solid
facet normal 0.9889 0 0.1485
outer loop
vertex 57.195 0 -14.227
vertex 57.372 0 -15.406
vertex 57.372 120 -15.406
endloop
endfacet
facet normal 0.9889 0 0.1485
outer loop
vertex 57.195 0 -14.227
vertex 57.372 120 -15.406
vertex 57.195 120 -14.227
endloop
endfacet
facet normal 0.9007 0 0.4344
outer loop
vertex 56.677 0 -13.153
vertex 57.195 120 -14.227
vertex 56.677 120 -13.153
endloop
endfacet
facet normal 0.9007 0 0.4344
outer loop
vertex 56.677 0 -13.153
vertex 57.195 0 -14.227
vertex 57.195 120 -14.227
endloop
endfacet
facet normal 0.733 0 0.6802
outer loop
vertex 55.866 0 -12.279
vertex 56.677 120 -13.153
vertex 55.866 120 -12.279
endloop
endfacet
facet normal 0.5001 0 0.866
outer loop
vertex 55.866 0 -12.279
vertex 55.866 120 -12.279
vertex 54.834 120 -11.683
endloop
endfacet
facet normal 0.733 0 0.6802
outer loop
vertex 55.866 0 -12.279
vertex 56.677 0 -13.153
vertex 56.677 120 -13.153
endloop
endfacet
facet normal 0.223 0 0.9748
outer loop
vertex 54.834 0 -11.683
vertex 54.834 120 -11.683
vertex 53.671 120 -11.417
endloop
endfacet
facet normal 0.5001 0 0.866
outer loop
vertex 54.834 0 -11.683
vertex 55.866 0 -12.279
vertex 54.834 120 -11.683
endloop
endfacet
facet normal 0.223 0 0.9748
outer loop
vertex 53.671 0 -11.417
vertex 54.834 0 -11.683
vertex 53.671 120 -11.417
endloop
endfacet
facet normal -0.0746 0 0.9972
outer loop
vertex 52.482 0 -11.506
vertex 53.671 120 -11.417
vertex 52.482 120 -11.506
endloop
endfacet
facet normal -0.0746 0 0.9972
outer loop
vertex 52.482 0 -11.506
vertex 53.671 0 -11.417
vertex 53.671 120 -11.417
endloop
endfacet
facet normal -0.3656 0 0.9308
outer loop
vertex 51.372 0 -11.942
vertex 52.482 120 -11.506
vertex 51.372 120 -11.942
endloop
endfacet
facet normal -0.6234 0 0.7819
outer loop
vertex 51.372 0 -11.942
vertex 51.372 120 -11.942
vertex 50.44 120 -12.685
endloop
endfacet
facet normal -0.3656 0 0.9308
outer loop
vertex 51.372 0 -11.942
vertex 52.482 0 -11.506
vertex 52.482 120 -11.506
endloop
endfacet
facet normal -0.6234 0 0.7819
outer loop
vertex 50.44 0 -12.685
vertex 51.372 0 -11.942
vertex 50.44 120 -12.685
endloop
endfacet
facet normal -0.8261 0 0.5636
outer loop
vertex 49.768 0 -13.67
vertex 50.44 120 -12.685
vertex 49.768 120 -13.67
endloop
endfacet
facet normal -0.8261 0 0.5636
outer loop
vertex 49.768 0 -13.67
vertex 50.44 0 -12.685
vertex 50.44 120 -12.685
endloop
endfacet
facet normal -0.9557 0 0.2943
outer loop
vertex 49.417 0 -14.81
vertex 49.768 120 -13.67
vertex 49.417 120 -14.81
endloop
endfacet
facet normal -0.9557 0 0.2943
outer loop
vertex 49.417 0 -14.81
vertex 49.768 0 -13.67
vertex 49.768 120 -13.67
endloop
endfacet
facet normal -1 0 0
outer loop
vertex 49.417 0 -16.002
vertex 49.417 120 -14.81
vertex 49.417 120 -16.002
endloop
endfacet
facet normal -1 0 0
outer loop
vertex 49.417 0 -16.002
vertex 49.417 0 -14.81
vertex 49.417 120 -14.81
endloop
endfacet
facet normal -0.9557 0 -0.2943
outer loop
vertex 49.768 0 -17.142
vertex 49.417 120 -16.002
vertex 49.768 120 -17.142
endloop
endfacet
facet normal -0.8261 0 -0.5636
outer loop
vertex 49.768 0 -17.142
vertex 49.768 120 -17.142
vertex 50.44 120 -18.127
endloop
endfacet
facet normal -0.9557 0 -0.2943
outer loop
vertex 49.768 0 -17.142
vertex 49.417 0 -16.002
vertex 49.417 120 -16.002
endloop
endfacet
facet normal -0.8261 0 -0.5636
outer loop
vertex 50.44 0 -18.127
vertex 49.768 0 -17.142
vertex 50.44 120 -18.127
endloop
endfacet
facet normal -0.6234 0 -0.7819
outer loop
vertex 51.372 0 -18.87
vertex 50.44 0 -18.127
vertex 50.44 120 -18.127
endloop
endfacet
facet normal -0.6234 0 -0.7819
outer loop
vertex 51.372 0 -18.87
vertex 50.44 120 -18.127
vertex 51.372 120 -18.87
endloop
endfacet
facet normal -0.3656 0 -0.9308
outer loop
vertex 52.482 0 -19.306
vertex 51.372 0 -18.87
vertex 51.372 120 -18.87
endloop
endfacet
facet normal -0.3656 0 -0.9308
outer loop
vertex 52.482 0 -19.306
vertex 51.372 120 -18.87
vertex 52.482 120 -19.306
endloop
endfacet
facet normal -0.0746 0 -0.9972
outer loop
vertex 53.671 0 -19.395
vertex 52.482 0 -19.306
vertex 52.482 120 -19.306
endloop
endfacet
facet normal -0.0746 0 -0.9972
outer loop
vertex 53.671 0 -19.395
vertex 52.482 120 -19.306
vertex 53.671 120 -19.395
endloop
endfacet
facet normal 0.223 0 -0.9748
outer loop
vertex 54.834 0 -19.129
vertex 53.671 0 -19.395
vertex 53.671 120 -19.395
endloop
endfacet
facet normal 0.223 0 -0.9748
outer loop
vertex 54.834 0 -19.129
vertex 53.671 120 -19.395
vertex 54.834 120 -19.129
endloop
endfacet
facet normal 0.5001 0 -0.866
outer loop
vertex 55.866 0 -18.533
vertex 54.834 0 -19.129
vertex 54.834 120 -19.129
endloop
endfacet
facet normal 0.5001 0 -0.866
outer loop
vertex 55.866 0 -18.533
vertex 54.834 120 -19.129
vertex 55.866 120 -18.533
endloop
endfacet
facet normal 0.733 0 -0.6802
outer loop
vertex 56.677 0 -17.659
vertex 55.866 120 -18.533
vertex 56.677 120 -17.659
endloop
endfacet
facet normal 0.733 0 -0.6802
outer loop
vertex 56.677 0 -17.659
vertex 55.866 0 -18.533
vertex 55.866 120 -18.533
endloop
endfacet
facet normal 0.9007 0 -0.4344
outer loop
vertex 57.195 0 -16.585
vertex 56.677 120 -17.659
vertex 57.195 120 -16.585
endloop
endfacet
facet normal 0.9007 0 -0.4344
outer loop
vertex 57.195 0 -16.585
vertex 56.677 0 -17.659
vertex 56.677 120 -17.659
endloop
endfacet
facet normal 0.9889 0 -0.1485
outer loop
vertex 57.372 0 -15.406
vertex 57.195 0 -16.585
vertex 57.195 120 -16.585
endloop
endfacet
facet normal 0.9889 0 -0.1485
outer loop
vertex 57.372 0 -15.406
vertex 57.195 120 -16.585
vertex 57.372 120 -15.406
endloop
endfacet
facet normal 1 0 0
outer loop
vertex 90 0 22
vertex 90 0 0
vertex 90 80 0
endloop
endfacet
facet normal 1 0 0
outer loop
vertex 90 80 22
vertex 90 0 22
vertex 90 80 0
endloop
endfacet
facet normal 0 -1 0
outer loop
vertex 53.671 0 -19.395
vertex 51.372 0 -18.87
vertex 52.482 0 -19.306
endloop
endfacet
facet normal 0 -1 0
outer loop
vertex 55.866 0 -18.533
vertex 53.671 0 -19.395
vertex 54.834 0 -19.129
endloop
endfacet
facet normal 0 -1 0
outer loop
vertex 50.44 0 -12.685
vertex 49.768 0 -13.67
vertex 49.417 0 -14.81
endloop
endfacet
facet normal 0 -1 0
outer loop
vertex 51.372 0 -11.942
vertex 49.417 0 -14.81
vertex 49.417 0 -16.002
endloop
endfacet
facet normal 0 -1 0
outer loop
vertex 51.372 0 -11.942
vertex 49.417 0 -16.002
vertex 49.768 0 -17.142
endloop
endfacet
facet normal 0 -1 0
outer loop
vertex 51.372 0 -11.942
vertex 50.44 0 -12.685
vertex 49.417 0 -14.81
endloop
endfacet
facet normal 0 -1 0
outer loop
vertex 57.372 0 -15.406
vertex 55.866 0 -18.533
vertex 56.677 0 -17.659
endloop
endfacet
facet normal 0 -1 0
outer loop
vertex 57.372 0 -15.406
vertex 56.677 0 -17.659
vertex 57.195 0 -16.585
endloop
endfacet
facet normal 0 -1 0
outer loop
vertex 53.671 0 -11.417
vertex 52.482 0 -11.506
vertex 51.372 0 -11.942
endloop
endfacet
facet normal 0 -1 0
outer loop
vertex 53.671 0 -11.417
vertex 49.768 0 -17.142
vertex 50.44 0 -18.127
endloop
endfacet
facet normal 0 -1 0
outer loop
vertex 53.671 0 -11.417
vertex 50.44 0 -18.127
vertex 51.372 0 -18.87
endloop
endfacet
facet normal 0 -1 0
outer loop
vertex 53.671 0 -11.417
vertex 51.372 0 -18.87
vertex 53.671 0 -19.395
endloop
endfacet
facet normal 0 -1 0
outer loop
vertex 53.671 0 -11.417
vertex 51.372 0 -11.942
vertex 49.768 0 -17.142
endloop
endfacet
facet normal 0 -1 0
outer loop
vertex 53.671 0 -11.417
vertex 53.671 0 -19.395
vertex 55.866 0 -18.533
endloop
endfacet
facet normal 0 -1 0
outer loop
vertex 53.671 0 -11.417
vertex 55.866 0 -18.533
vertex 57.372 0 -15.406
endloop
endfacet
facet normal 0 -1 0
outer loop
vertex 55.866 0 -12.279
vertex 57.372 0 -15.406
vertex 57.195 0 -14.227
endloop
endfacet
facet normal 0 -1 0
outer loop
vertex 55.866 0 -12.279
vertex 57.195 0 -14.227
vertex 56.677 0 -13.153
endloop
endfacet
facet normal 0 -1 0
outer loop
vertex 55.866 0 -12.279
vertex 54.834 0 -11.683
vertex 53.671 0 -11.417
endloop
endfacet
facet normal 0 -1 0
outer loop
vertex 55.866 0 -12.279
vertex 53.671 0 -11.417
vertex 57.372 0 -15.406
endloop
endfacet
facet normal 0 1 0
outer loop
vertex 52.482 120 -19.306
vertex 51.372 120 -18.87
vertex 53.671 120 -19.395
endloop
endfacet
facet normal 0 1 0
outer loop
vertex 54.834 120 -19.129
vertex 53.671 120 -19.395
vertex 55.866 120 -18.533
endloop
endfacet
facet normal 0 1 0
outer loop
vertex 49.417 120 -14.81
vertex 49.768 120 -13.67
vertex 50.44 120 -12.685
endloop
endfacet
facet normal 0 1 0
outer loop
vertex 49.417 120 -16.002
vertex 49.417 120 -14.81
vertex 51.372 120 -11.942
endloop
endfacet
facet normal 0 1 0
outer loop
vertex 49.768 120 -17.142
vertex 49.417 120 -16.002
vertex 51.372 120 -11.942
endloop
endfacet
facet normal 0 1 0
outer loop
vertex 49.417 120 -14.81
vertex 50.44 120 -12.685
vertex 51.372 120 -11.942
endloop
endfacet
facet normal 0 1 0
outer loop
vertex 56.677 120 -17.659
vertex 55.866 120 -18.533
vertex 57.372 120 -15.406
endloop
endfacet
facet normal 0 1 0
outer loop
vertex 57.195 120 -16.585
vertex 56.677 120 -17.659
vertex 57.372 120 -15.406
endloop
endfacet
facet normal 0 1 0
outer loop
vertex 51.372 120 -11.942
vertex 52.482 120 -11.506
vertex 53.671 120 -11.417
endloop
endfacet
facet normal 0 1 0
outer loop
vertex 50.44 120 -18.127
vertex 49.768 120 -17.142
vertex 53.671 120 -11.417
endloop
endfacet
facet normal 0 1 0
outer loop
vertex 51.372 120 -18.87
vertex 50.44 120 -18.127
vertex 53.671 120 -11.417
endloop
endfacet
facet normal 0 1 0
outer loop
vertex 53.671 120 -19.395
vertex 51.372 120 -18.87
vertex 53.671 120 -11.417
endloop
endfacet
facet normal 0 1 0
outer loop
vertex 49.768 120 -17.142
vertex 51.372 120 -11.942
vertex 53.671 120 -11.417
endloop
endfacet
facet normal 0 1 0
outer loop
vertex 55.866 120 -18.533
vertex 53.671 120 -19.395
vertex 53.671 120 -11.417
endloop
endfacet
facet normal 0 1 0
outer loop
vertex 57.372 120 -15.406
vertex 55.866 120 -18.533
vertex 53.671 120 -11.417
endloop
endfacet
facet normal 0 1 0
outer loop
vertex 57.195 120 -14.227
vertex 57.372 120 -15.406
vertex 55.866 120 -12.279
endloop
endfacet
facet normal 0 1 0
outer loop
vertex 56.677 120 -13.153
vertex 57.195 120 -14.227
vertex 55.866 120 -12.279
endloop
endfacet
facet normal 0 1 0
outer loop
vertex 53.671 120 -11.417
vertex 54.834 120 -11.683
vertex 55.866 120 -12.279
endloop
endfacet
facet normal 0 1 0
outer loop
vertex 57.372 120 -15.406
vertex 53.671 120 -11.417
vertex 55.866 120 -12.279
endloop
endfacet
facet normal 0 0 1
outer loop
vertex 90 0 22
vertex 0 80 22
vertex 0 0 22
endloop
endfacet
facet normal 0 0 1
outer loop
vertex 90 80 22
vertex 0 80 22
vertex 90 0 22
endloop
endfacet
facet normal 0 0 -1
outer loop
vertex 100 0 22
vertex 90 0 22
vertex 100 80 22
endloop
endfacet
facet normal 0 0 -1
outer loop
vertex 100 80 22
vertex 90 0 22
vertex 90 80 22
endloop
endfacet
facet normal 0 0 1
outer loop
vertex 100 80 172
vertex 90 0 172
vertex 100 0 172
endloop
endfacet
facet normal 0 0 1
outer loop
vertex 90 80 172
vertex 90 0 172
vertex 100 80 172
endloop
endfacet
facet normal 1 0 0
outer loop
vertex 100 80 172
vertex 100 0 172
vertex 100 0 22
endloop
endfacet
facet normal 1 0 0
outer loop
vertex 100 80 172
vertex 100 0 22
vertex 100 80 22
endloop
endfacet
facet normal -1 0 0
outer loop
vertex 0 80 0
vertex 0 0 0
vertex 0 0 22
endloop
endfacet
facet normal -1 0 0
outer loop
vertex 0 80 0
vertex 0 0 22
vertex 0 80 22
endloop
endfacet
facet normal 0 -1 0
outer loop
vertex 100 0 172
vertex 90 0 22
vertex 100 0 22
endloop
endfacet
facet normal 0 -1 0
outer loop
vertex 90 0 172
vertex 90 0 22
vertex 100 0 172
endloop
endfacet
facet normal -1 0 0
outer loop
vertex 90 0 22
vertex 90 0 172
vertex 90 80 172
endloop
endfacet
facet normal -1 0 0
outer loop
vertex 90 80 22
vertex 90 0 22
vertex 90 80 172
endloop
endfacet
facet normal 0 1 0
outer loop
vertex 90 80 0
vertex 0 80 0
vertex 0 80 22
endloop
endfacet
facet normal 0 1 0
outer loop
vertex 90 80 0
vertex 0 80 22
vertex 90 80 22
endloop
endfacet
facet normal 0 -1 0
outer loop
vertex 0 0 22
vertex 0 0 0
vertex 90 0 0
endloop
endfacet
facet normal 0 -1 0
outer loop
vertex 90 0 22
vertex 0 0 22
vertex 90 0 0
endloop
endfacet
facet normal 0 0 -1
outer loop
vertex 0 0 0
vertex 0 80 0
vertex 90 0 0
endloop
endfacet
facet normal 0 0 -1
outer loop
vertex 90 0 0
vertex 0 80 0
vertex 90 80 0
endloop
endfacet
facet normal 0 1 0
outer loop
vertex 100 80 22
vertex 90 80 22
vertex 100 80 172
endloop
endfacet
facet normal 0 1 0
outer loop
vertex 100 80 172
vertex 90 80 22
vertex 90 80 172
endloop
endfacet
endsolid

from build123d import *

# Parameters (mm, degrees)
F0_W     = 90
F0_H     = 80
F1_DEPTH = 22
F2_R     = 4
F3_DEPTH = 120
F4_W     = 80
F4_H     = 150
F5_DEPTH = 10


with BuildPart() as f1:
    # F0 (on Top) → F1 (new body)
    with BuildSketch(Plane.XY):
        with Locations((45, 40)):
            Rectangle(F0_W, F0_H)
    extrude(amount=F1_DEPTH)


with BuildPart() as f3:
    # F2 (on Front) → F3 (new body)
    with BuildSketch(Plane.XZ):
        with Locations((53.372305, -15.405996)):
            Circle(F2_R)
    extrude(amount=-F3_DEPTH)


with BuildPart() as f5:
    # F4 (on face) → F5 (new body)
    with BuildSketch(Plane.YZ.offset(90)):
        with Locations((40, 97)):
            Rectangle(F4_W, F4_H)
    extrude(amount=F5_DEPTH)


solid = Compound([f1.part, f3.part, f5.part])
